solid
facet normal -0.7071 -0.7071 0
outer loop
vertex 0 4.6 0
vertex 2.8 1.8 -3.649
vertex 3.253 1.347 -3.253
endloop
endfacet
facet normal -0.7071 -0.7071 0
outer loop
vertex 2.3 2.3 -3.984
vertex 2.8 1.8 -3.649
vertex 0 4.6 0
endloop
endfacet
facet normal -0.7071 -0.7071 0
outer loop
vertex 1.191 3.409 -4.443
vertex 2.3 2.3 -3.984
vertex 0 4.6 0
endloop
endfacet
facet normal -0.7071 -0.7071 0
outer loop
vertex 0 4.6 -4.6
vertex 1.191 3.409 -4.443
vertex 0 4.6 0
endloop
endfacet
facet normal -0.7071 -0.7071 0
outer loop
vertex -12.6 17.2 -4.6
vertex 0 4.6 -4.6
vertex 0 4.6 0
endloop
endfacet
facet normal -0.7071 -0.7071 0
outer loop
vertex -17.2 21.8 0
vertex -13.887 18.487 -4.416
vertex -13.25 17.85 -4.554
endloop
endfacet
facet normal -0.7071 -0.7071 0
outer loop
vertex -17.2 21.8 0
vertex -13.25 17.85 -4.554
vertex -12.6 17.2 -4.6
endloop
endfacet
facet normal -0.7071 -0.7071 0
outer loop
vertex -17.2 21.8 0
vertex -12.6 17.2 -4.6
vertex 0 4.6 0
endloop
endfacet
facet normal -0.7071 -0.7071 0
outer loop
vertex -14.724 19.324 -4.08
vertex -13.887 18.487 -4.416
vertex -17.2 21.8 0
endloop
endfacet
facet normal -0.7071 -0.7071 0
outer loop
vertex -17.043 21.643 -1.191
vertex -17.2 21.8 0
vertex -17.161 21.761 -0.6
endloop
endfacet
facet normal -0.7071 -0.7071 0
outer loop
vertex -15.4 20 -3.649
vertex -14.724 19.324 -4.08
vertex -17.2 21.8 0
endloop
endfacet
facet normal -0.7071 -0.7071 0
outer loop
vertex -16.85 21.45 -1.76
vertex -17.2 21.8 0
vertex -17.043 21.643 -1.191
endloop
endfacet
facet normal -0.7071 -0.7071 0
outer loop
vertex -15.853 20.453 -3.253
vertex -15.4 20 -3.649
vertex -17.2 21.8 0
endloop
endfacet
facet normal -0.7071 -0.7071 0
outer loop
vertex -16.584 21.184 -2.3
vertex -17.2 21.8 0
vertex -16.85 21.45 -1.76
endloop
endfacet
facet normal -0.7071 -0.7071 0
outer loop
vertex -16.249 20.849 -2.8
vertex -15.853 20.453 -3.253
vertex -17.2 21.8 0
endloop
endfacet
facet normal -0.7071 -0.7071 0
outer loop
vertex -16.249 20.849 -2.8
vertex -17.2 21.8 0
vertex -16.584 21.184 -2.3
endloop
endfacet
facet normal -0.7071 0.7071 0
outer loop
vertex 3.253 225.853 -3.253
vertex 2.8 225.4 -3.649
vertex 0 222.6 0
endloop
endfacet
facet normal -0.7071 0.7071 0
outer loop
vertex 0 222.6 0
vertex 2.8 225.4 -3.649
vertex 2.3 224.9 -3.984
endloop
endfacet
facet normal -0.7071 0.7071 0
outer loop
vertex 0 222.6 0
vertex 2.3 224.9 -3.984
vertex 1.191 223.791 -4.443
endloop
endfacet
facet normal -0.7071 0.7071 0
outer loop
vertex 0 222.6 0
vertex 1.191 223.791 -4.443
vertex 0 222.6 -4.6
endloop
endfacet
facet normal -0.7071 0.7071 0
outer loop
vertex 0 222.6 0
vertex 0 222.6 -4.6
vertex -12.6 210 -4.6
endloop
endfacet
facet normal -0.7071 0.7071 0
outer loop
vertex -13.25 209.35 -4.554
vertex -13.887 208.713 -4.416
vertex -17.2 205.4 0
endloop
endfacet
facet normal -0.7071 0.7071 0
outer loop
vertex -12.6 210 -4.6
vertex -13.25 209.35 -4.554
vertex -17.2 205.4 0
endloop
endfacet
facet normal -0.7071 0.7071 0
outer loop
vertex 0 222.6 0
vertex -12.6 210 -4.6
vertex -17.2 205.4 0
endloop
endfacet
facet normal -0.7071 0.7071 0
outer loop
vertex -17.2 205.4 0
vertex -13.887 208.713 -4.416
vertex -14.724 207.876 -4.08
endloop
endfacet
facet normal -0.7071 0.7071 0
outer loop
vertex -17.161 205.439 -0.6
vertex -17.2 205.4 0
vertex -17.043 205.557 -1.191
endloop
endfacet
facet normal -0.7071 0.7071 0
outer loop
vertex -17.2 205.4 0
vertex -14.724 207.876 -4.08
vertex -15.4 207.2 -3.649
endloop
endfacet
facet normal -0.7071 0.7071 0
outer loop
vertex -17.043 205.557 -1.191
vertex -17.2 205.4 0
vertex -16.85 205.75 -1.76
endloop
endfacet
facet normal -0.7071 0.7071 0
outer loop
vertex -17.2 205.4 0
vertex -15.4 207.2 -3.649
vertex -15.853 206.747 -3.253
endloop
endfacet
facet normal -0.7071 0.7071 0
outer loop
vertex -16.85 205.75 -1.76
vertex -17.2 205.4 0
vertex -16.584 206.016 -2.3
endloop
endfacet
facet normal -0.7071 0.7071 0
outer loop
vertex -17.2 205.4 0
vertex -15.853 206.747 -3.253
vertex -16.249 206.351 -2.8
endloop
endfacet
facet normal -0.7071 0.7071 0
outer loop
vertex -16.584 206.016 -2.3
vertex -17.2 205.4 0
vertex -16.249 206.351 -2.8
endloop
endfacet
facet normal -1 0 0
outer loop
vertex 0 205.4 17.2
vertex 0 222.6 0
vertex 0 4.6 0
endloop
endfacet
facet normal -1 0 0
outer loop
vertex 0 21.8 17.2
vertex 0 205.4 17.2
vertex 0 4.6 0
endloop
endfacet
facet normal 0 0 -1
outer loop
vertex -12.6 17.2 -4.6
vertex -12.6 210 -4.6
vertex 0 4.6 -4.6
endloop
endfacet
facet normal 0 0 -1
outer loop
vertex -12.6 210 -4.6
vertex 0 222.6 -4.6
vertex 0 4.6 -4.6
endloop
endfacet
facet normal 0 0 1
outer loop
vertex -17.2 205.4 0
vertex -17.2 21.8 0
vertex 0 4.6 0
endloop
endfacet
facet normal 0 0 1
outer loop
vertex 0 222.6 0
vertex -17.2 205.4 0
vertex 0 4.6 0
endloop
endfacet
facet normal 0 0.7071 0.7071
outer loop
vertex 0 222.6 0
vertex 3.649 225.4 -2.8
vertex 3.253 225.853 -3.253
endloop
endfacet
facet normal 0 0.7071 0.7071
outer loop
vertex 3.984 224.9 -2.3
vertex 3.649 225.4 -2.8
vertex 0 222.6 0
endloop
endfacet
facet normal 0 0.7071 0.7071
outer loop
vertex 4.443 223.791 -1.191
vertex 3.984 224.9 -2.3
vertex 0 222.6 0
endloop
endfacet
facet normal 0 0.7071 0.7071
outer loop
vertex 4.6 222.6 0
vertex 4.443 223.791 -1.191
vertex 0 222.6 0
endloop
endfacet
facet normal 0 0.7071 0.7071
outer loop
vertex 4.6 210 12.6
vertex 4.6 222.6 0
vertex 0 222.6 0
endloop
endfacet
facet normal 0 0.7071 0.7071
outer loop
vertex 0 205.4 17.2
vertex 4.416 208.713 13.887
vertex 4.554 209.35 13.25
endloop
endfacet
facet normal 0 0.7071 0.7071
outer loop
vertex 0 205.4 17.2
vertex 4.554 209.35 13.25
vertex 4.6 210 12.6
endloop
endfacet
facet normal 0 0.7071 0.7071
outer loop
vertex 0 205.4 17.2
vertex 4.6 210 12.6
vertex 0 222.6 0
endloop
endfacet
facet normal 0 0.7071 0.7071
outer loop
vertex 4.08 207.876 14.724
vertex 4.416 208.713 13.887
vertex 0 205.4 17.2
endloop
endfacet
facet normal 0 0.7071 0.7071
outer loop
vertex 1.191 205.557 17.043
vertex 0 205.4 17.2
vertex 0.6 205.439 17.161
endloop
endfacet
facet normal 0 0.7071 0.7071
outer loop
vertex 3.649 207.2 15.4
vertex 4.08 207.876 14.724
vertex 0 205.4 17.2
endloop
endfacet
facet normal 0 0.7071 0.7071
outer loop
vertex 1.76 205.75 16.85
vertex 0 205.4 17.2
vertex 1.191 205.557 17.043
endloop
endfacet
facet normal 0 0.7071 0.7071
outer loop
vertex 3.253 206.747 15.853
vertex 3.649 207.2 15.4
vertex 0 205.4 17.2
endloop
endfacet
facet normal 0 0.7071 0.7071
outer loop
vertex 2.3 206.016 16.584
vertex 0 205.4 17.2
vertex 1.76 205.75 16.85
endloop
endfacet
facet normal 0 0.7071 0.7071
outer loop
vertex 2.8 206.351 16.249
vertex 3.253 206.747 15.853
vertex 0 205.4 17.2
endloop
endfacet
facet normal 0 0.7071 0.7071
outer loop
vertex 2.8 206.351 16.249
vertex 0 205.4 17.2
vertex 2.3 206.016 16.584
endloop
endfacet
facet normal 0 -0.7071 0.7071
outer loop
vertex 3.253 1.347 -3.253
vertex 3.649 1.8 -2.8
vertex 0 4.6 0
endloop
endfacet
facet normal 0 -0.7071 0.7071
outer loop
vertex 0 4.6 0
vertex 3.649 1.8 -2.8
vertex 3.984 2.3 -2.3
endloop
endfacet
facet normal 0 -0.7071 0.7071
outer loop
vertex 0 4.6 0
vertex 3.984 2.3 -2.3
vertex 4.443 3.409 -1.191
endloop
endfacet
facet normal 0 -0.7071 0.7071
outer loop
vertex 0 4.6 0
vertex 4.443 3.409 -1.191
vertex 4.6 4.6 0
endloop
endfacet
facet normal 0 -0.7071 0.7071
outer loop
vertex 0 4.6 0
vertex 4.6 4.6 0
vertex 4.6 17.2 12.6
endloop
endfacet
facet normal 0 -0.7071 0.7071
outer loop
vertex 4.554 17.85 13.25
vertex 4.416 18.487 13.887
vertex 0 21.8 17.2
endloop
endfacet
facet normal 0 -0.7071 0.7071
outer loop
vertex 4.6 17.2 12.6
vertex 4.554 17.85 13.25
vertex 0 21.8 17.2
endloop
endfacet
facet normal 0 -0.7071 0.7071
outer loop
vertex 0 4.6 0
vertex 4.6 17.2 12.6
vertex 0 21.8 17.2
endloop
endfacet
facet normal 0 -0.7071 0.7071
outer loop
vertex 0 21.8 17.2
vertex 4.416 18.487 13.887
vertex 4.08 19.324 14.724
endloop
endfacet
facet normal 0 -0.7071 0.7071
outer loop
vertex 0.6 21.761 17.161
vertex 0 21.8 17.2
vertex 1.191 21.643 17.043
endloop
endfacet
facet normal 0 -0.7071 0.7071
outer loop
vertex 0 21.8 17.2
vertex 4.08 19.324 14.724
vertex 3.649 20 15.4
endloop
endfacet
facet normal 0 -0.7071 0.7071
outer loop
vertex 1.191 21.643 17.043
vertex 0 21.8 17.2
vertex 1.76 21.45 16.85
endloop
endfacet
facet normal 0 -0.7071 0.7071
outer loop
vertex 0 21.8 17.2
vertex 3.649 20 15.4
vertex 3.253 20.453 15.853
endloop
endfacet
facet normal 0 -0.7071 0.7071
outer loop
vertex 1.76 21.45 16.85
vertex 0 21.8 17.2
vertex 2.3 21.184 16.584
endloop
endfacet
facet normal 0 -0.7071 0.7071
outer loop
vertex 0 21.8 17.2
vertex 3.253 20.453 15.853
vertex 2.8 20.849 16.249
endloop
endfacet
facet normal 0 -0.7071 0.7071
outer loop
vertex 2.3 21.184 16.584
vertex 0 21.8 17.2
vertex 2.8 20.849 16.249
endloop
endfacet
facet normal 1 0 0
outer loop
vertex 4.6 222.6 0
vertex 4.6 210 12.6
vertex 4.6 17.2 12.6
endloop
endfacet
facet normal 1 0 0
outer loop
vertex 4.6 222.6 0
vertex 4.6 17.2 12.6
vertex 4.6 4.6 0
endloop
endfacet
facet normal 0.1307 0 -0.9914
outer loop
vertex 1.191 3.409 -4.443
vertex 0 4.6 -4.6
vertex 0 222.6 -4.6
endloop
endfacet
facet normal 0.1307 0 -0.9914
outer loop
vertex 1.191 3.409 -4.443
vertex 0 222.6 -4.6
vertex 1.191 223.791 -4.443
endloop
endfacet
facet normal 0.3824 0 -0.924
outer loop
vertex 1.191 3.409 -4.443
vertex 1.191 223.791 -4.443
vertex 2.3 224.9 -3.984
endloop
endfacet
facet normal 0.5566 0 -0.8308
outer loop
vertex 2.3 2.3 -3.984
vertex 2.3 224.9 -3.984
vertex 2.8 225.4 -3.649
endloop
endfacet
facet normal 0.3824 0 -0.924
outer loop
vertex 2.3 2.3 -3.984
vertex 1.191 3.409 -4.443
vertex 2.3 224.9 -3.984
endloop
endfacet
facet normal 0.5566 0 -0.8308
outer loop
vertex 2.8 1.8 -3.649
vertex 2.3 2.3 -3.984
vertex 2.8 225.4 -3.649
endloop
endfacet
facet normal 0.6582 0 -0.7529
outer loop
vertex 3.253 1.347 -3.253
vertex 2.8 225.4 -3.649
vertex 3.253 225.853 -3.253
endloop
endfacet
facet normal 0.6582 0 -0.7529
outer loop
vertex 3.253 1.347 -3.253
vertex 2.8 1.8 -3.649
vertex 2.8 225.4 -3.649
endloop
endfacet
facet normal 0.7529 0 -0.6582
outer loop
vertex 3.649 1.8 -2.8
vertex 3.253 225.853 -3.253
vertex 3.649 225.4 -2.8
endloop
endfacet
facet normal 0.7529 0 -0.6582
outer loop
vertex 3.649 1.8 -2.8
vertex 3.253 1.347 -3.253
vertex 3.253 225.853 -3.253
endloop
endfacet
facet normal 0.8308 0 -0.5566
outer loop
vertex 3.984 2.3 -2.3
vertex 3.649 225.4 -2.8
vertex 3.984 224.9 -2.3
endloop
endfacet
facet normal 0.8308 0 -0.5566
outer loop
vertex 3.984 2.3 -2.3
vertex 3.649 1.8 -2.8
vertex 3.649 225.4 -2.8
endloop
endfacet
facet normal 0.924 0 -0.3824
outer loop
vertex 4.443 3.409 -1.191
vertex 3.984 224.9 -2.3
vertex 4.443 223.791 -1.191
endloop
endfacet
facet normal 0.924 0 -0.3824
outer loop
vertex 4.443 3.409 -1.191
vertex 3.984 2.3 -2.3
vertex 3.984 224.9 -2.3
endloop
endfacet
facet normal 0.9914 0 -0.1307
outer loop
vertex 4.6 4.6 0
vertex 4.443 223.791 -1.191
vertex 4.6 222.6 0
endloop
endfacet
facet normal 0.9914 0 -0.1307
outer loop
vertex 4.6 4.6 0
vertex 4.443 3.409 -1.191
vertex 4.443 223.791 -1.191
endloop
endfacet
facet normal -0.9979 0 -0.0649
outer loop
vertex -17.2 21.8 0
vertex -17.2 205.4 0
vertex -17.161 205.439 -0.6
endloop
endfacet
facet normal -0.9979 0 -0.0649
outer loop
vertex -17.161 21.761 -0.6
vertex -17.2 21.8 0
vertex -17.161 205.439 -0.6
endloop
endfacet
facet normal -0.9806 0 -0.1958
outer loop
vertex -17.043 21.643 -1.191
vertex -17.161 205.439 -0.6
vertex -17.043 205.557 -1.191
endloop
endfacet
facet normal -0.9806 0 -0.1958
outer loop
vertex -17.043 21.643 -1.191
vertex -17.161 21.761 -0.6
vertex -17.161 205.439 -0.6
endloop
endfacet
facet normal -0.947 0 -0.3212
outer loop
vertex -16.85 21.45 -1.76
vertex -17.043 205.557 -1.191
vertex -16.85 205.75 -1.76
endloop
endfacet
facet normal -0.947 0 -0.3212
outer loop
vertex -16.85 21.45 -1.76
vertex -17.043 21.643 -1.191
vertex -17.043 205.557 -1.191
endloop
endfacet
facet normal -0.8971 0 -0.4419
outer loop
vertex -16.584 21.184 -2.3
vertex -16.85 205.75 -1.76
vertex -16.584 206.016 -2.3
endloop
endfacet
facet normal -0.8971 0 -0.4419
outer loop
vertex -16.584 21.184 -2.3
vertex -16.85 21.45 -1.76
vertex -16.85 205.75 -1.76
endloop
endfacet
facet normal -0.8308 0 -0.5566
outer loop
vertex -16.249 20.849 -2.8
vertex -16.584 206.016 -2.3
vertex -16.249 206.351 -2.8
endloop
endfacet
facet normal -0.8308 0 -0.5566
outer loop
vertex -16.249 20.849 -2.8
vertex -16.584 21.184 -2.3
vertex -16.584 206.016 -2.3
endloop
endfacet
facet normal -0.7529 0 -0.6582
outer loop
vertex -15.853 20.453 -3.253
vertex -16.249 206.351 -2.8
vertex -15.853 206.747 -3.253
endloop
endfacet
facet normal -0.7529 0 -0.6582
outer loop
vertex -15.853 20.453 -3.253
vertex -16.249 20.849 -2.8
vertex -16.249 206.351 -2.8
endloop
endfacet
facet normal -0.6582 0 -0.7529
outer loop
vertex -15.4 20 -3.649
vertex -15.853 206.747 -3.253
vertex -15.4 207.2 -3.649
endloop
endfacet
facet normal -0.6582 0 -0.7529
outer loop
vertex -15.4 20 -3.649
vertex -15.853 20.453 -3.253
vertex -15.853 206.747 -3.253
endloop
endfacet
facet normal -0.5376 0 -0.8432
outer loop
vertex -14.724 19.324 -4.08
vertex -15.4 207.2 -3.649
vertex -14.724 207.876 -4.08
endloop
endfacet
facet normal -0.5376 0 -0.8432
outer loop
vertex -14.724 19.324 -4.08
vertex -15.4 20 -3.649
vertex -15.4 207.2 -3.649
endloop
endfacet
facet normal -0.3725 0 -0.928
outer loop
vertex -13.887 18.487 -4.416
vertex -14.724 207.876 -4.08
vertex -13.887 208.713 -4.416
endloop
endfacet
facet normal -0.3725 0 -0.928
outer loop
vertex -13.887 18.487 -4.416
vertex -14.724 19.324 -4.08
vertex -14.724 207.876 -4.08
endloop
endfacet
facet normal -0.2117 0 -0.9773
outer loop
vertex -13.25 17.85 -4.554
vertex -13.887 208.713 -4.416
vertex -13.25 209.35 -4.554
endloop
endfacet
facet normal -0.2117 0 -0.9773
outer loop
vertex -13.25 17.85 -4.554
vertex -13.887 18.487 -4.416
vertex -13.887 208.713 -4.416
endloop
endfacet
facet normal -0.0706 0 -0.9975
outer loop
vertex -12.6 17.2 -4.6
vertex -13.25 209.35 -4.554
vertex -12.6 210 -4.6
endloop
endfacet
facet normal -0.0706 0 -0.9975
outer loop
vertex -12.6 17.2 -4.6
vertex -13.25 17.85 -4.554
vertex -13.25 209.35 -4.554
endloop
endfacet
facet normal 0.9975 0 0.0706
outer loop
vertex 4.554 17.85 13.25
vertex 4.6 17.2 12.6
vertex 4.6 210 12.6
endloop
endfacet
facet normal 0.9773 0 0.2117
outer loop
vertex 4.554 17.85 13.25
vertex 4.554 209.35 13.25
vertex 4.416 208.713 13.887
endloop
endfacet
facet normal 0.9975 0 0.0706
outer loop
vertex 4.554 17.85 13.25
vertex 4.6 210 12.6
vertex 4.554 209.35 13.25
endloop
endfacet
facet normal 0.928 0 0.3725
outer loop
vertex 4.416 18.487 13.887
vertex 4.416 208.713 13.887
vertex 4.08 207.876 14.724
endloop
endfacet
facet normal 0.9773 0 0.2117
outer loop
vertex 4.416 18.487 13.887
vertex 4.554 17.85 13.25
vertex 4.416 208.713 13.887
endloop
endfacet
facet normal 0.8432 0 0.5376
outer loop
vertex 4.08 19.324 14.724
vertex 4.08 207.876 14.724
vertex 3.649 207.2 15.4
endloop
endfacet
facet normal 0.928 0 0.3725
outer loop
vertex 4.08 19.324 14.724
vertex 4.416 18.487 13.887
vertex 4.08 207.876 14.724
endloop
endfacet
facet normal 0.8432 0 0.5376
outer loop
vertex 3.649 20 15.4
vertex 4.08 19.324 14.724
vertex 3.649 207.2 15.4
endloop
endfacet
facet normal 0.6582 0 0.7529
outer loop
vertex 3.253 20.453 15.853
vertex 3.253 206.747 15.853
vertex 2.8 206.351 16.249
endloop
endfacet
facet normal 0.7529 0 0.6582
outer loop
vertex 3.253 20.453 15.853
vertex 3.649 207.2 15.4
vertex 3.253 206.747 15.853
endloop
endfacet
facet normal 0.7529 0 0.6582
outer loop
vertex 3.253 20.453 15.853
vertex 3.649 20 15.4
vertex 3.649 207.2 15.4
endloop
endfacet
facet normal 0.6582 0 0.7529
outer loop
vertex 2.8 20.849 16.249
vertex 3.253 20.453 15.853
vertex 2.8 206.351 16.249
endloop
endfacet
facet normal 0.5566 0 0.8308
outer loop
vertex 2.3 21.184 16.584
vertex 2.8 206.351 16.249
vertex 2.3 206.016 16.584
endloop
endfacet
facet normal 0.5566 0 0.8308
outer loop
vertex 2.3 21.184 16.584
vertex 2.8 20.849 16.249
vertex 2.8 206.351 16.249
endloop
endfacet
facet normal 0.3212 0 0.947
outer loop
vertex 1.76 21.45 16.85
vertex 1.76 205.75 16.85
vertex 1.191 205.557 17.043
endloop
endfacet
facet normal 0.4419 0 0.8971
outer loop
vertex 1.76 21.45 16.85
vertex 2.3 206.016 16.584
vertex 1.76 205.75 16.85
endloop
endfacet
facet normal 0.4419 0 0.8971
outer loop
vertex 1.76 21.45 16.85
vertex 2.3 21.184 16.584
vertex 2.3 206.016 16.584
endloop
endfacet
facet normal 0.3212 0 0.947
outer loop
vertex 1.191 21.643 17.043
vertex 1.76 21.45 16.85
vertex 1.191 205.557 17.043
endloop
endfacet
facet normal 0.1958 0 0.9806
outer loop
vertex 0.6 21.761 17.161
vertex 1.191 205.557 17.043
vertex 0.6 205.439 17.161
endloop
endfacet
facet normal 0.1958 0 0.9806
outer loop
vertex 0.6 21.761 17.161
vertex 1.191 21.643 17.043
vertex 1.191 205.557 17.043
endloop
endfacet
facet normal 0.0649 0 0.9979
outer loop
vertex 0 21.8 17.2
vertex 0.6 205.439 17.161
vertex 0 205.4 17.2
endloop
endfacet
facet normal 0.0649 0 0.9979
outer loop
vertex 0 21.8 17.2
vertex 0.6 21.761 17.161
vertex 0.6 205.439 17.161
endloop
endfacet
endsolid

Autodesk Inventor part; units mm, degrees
ref_plane "YZ Plane" through (0, 0, 0) normal (1, 0, 0) x (0, 1, 0)
ref_plane "XZ Plane" through (0, 0, 0) normal (0, 1, 0) x (-1, 0, 0)
ref_plane "XY Plane" through (0, 0, 0) normal (0, 0, 1) x (1, 0, 0)
sketch "Skizze1" plane through (0, 0, 0) normal (0, 1, 0) x (-1, 0, 0)
  line L0 (-4.6, 12.6) -> (-4.6, 0)
  arc A0 (-4.6, 0) -> (0, -4.6) centre (0, 0) ccw
  line L1 (0, -4.6) -> (12.6, -4.6)
  arc A1 (12.6, -4.6) -> (17.2, 0) centre (12.6, 0) ccw
  line L2 (17.2, 0) -> (0, 0)
  line L3 (0, 0) -> (0, 17.2)
  arc A2 (0, 17.2) -> (-4.6, 12.6) centre (0, 12.6) ccw
  point P0 (0, 0)
  dimension "d0" = 4.6
  dimension "d1" = 21.8
extrude "Extrusion1" add sketch "Skizze1" along normal blind 227.2
sketch "Skizze2" plane through (0, 0, -4.6) normal (0, 0, -1) x (-1, 0, 0)
  line L0 (-4.6, 0) -> (17.2, 21.8)
  line L1 (17.2, 0) -> (17.2, 227.2) projected
  line L2 (17.2, 0) -> (12.6, 0) projected
  line L3 (17.2, 21.8) -> (17.2, 0)
  line L4 (17.2, 0) -> (-4.6, 0)
  line L5 (17.2, 227.2) -> (-4.6, 227.2)
  line L6 (-4.6, 227.2) -> (17.2, 205.4)
  line L7 (17.2, 227.2) -> (17.2, 205.4)
  point P0 (0, 0)
  dimension "d4" = 45
  dimension "d7" = 45
extrude "Extrusion2" cut sketch "Skizze2" against normal through all
sketch "Skizze3" plane through (4.6, 0, 0) normal (1, 0, 0) x (0, 0, -1)
  line L0 (4.6, 0) -> (-17.2, 21.8)
  line L1 (-17.2, 4.6) -> (-17.2, 222.6) projected
  line L2 (-17.2, 21.8) -> (-17.2, 0)
  line L3 (-17.2, 0) -> (4.6, 0)
  line L4 (-17.2, 205.4) -> (-17.2, 227.2)
  line L5 (-17.2, 227.2) -> (4.6, 227.2)
  line L6 (4.6, 227.2) -> (-17.2, 205.4)
  point P0 (0, 0)
  point P1 (4.6, 4.6)
  point P2 (-12.6, 227.2)
  dimension "d8" = 45
  dimension "d9" = 45
extrude "Extrusion3" cut sketch "Skizze3" against normal through all
properties part number "winkelTop" material "Kiefer"
